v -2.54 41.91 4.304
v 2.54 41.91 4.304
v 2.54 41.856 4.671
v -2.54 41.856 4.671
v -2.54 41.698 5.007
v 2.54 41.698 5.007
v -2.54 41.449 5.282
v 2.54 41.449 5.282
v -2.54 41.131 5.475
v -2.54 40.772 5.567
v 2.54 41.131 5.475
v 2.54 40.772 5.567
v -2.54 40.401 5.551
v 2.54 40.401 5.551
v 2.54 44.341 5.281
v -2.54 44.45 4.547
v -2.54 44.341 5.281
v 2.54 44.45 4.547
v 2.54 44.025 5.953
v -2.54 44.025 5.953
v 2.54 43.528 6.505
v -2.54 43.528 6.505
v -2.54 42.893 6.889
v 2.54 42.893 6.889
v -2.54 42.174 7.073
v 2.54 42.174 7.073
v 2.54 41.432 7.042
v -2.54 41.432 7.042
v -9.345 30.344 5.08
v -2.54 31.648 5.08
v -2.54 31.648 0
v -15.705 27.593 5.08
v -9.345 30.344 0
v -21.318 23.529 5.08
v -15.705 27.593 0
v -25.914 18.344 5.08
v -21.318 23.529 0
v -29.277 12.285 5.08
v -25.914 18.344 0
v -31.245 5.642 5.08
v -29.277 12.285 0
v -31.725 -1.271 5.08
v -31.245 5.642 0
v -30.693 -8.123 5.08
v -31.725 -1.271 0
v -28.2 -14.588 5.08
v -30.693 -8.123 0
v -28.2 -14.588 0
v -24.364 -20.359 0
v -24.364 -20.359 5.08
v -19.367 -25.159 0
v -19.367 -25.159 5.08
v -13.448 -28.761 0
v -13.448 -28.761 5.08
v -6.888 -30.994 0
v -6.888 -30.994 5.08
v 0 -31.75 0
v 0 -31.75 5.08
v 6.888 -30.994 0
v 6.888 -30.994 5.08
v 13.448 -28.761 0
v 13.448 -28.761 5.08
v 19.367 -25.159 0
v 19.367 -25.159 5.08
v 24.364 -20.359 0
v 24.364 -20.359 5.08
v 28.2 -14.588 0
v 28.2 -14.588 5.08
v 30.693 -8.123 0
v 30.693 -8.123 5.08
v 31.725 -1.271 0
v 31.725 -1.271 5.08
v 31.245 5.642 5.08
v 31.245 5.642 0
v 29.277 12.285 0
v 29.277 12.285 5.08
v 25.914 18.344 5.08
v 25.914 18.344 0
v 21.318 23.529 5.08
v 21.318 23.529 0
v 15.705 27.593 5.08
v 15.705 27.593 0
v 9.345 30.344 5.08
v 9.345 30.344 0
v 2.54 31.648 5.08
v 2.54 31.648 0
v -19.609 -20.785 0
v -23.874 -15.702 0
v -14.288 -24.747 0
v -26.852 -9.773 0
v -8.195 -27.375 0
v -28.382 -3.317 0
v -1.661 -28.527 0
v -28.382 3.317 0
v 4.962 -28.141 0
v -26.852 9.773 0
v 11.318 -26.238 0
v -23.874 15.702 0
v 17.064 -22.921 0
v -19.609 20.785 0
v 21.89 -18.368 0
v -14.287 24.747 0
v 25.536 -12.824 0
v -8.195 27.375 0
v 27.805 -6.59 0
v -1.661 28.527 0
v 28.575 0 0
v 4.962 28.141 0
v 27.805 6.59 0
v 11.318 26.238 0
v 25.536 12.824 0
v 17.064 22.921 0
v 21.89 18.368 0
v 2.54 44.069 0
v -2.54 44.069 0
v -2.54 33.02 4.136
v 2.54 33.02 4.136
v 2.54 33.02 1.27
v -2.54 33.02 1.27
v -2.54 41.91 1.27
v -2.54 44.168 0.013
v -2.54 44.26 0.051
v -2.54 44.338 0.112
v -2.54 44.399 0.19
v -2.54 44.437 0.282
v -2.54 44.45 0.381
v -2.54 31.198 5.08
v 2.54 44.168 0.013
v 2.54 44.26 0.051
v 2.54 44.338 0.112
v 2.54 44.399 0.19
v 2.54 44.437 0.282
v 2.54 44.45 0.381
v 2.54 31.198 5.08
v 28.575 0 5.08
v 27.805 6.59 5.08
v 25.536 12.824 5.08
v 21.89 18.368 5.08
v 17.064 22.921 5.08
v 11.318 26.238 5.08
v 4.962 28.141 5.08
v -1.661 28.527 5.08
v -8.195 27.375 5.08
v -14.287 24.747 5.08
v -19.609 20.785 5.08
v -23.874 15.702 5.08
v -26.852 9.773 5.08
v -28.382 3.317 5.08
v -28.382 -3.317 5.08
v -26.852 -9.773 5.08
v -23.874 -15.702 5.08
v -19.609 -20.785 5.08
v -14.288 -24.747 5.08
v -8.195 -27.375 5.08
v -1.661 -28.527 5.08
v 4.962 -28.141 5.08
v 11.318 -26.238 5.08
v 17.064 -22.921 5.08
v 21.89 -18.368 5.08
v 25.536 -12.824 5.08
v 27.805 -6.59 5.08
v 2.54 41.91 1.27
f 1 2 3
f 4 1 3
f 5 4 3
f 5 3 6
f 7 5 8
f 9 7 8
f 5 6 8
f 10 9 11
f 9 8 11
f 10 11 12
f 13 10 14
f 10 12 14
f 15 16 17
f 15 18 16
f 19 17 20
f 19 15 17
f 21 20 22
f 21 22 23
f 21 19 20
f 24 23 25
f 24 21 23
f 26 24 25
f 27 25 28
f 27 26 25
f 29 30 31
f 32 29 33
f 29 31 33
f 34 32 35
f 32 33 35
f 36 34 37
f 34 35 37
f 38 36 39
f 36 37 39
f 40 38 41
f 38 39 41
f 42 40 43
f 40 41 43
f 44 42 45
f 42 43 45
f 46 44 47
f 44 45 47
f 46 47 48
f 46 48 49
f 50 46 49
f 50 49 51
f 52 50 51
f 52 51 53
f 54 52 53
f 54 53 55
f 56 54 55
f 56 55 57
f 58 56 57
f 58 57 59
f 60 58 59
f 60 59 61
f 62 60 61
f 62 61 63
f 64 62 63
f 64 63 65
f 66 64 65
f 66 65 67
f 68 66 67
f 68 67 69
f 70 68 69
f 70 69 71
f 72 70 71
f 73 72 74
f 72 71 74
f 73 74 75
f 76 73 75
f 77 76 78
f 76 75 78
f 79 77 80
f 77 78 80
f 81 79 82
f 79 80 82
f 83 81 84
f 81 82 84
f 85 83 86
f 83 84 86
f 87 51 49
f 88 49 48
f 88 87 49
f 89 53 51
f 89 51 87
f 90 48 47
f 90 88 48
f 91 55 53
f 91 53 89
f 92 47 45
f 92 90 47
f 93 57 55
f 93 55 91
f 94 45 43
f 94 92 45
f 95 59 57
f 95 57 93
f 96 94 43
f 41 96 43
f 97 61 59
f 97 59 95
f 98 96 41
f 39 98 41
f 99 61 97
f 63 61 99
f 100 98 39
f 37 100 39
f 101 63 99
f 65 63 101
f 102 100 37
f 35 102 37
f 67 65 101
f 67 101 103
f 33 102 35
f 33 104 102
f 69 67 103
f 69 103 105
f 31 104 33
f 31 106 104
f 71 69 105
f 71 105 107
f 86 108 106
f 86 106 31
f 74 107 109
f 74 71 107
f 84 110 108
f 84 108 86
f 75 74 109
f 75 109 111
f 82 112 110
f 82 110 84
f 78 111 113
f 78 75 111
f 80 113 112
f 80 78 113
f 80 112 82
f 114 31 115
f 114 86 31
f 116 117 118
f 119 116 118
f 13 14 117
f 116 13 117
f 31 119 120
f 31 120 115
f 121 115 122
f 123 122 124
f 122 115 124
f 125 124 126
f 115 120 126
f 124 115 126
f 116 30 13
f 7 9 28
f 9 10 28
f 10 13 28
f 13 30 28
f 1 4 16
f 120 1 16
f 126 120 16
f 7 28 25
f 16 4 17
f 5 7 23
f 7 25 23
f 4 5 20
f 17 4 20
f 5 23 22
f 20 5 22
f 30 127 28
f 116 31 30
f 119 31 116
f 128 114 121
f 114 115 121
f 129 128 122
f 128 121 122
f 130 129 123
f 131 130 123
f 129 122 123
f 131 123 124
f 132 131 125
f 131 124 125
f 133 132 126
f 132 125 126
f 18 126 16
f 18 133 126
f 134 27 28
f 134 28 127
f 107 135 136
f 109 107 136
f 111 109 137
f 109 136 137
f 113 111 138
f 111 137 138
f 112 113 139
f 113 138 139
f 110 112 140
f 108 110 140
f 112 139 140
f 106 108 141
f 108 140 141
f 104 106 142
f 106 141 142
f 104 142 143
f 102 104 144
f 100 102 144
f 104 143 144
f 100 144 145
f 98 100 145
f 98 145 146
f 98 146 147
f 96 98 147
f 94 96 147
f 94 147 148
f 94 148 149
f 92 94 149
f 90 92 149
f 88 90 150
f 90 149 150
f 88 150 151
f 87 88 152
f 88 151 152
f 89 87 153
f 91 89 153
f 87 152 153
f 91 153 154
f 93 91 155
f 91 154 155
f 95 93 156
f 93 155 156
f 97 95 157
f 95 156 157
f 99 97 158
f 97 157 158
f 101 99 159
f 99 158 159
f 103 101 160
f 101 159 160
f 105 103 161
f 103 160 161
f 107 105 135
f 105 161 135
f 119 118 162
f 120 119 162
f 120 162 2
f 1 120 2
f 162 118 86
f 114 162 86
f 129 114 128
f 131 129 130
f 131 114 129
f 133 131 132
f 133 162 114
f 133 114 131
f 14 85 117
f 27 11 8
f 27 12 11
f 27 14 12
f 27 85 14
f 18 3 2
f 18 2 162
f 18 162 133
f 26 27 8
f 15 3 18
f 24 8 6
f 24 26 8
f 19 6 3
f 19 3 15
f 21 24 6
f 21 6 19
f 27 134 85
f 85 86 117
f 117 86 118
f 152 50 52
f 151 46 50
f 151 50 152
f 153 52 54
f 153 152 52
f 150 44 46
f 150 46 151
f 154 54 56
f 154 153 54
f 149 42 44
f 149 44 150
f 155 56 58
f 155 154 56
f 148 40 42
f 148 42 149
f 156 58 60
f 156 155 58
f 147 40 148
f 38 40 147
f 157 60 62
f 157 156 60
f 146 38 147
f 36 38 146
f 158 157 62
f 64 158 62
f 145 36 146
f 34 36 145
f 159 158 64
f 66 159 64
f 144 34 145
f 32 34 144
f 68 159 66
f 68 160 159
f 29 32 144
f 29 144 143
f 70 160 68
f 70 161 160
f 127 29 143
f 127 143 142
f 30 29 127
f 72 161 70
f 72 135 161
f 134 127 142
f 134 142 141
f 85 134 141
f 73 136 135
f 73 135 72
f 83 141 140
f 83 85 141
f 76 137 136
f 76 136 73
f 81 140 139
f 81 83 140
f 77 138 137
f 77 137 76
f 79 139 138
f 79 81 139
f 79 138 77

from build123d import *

# Parameters (mm, degrees)
F0_R          = 31.75
F1_DEPTH      = 5.08
F2_R          = 28.575
F3_DEPTH      = 5.08
F5_DEPTH      = 2.54
F5_DEPTH_BACK = 2.54
F6_R          = 0.381
F8_DEPTH      = 25.4


with BuildPart() as f1:
    # F0 (on Top) → F1 (new body)
    with BuildSketch(Plane.XY):
        Circle(F0_R)
    extrude(amount=F1_DEPTH)

    # F2 (on face) → F3 (cut, through all)
    with BuildSketch(Plane.XY.offset(5.08)):
        Circle(F2_R)
    extrude(amount=-F3_DEPTH, mode=Mode.SUBTRACT)

    # F4 (on Right) → F5 (join, two sides)
    with BuildSketch(Plane.YZ) as f5_sk:
        with BuildLine():
            Line((41.43187, 7.041525), (29.21, 4.699))
            Line((29.21, 4.699), (29.21, 0))
            Line((29.21, 0), (44.45, 0))
            Line((44.45, 0), (44.45, 4.546933))
            ThreePointArc((44.45, 4.546933), (43.528201, 6.504744), (41.43187, 7.041525))
        make_face()
    extrude(amount=F5_DEPTH)
    extrude(f5_sk.sketch, amount=-F5_DEPTH_BACK)

    # F6
    f6_edges = [f1.edges().sort_by_distance(p)[0] for p in [
        (0, 44.45, 0),
    ]]
    fillet(f6_edges, radius=F6_R)

    # F7 (on face) → F8 (cut)
    with BuildSketch(Plane.YZ.offset(2.54)):
        with BuildLine():
            Line((40.400935, 5.550812), (33.02, 4.136133))
            Line((33.02, 4.136133), (33.02, 1.27))
            Line((33.02, 1.27), (41.91, 1.27))
            Line((41.91, 1.27), (41.91, 4.303516))
            ThreePointArc((41.91, 4.303516), (41.449101, 5.282422), (40.400935, 5.550812))
        make_face()
    extrude(amount=-F8_DEPTH, mode=Mode.SUBTRACT)


solid = f1.part
